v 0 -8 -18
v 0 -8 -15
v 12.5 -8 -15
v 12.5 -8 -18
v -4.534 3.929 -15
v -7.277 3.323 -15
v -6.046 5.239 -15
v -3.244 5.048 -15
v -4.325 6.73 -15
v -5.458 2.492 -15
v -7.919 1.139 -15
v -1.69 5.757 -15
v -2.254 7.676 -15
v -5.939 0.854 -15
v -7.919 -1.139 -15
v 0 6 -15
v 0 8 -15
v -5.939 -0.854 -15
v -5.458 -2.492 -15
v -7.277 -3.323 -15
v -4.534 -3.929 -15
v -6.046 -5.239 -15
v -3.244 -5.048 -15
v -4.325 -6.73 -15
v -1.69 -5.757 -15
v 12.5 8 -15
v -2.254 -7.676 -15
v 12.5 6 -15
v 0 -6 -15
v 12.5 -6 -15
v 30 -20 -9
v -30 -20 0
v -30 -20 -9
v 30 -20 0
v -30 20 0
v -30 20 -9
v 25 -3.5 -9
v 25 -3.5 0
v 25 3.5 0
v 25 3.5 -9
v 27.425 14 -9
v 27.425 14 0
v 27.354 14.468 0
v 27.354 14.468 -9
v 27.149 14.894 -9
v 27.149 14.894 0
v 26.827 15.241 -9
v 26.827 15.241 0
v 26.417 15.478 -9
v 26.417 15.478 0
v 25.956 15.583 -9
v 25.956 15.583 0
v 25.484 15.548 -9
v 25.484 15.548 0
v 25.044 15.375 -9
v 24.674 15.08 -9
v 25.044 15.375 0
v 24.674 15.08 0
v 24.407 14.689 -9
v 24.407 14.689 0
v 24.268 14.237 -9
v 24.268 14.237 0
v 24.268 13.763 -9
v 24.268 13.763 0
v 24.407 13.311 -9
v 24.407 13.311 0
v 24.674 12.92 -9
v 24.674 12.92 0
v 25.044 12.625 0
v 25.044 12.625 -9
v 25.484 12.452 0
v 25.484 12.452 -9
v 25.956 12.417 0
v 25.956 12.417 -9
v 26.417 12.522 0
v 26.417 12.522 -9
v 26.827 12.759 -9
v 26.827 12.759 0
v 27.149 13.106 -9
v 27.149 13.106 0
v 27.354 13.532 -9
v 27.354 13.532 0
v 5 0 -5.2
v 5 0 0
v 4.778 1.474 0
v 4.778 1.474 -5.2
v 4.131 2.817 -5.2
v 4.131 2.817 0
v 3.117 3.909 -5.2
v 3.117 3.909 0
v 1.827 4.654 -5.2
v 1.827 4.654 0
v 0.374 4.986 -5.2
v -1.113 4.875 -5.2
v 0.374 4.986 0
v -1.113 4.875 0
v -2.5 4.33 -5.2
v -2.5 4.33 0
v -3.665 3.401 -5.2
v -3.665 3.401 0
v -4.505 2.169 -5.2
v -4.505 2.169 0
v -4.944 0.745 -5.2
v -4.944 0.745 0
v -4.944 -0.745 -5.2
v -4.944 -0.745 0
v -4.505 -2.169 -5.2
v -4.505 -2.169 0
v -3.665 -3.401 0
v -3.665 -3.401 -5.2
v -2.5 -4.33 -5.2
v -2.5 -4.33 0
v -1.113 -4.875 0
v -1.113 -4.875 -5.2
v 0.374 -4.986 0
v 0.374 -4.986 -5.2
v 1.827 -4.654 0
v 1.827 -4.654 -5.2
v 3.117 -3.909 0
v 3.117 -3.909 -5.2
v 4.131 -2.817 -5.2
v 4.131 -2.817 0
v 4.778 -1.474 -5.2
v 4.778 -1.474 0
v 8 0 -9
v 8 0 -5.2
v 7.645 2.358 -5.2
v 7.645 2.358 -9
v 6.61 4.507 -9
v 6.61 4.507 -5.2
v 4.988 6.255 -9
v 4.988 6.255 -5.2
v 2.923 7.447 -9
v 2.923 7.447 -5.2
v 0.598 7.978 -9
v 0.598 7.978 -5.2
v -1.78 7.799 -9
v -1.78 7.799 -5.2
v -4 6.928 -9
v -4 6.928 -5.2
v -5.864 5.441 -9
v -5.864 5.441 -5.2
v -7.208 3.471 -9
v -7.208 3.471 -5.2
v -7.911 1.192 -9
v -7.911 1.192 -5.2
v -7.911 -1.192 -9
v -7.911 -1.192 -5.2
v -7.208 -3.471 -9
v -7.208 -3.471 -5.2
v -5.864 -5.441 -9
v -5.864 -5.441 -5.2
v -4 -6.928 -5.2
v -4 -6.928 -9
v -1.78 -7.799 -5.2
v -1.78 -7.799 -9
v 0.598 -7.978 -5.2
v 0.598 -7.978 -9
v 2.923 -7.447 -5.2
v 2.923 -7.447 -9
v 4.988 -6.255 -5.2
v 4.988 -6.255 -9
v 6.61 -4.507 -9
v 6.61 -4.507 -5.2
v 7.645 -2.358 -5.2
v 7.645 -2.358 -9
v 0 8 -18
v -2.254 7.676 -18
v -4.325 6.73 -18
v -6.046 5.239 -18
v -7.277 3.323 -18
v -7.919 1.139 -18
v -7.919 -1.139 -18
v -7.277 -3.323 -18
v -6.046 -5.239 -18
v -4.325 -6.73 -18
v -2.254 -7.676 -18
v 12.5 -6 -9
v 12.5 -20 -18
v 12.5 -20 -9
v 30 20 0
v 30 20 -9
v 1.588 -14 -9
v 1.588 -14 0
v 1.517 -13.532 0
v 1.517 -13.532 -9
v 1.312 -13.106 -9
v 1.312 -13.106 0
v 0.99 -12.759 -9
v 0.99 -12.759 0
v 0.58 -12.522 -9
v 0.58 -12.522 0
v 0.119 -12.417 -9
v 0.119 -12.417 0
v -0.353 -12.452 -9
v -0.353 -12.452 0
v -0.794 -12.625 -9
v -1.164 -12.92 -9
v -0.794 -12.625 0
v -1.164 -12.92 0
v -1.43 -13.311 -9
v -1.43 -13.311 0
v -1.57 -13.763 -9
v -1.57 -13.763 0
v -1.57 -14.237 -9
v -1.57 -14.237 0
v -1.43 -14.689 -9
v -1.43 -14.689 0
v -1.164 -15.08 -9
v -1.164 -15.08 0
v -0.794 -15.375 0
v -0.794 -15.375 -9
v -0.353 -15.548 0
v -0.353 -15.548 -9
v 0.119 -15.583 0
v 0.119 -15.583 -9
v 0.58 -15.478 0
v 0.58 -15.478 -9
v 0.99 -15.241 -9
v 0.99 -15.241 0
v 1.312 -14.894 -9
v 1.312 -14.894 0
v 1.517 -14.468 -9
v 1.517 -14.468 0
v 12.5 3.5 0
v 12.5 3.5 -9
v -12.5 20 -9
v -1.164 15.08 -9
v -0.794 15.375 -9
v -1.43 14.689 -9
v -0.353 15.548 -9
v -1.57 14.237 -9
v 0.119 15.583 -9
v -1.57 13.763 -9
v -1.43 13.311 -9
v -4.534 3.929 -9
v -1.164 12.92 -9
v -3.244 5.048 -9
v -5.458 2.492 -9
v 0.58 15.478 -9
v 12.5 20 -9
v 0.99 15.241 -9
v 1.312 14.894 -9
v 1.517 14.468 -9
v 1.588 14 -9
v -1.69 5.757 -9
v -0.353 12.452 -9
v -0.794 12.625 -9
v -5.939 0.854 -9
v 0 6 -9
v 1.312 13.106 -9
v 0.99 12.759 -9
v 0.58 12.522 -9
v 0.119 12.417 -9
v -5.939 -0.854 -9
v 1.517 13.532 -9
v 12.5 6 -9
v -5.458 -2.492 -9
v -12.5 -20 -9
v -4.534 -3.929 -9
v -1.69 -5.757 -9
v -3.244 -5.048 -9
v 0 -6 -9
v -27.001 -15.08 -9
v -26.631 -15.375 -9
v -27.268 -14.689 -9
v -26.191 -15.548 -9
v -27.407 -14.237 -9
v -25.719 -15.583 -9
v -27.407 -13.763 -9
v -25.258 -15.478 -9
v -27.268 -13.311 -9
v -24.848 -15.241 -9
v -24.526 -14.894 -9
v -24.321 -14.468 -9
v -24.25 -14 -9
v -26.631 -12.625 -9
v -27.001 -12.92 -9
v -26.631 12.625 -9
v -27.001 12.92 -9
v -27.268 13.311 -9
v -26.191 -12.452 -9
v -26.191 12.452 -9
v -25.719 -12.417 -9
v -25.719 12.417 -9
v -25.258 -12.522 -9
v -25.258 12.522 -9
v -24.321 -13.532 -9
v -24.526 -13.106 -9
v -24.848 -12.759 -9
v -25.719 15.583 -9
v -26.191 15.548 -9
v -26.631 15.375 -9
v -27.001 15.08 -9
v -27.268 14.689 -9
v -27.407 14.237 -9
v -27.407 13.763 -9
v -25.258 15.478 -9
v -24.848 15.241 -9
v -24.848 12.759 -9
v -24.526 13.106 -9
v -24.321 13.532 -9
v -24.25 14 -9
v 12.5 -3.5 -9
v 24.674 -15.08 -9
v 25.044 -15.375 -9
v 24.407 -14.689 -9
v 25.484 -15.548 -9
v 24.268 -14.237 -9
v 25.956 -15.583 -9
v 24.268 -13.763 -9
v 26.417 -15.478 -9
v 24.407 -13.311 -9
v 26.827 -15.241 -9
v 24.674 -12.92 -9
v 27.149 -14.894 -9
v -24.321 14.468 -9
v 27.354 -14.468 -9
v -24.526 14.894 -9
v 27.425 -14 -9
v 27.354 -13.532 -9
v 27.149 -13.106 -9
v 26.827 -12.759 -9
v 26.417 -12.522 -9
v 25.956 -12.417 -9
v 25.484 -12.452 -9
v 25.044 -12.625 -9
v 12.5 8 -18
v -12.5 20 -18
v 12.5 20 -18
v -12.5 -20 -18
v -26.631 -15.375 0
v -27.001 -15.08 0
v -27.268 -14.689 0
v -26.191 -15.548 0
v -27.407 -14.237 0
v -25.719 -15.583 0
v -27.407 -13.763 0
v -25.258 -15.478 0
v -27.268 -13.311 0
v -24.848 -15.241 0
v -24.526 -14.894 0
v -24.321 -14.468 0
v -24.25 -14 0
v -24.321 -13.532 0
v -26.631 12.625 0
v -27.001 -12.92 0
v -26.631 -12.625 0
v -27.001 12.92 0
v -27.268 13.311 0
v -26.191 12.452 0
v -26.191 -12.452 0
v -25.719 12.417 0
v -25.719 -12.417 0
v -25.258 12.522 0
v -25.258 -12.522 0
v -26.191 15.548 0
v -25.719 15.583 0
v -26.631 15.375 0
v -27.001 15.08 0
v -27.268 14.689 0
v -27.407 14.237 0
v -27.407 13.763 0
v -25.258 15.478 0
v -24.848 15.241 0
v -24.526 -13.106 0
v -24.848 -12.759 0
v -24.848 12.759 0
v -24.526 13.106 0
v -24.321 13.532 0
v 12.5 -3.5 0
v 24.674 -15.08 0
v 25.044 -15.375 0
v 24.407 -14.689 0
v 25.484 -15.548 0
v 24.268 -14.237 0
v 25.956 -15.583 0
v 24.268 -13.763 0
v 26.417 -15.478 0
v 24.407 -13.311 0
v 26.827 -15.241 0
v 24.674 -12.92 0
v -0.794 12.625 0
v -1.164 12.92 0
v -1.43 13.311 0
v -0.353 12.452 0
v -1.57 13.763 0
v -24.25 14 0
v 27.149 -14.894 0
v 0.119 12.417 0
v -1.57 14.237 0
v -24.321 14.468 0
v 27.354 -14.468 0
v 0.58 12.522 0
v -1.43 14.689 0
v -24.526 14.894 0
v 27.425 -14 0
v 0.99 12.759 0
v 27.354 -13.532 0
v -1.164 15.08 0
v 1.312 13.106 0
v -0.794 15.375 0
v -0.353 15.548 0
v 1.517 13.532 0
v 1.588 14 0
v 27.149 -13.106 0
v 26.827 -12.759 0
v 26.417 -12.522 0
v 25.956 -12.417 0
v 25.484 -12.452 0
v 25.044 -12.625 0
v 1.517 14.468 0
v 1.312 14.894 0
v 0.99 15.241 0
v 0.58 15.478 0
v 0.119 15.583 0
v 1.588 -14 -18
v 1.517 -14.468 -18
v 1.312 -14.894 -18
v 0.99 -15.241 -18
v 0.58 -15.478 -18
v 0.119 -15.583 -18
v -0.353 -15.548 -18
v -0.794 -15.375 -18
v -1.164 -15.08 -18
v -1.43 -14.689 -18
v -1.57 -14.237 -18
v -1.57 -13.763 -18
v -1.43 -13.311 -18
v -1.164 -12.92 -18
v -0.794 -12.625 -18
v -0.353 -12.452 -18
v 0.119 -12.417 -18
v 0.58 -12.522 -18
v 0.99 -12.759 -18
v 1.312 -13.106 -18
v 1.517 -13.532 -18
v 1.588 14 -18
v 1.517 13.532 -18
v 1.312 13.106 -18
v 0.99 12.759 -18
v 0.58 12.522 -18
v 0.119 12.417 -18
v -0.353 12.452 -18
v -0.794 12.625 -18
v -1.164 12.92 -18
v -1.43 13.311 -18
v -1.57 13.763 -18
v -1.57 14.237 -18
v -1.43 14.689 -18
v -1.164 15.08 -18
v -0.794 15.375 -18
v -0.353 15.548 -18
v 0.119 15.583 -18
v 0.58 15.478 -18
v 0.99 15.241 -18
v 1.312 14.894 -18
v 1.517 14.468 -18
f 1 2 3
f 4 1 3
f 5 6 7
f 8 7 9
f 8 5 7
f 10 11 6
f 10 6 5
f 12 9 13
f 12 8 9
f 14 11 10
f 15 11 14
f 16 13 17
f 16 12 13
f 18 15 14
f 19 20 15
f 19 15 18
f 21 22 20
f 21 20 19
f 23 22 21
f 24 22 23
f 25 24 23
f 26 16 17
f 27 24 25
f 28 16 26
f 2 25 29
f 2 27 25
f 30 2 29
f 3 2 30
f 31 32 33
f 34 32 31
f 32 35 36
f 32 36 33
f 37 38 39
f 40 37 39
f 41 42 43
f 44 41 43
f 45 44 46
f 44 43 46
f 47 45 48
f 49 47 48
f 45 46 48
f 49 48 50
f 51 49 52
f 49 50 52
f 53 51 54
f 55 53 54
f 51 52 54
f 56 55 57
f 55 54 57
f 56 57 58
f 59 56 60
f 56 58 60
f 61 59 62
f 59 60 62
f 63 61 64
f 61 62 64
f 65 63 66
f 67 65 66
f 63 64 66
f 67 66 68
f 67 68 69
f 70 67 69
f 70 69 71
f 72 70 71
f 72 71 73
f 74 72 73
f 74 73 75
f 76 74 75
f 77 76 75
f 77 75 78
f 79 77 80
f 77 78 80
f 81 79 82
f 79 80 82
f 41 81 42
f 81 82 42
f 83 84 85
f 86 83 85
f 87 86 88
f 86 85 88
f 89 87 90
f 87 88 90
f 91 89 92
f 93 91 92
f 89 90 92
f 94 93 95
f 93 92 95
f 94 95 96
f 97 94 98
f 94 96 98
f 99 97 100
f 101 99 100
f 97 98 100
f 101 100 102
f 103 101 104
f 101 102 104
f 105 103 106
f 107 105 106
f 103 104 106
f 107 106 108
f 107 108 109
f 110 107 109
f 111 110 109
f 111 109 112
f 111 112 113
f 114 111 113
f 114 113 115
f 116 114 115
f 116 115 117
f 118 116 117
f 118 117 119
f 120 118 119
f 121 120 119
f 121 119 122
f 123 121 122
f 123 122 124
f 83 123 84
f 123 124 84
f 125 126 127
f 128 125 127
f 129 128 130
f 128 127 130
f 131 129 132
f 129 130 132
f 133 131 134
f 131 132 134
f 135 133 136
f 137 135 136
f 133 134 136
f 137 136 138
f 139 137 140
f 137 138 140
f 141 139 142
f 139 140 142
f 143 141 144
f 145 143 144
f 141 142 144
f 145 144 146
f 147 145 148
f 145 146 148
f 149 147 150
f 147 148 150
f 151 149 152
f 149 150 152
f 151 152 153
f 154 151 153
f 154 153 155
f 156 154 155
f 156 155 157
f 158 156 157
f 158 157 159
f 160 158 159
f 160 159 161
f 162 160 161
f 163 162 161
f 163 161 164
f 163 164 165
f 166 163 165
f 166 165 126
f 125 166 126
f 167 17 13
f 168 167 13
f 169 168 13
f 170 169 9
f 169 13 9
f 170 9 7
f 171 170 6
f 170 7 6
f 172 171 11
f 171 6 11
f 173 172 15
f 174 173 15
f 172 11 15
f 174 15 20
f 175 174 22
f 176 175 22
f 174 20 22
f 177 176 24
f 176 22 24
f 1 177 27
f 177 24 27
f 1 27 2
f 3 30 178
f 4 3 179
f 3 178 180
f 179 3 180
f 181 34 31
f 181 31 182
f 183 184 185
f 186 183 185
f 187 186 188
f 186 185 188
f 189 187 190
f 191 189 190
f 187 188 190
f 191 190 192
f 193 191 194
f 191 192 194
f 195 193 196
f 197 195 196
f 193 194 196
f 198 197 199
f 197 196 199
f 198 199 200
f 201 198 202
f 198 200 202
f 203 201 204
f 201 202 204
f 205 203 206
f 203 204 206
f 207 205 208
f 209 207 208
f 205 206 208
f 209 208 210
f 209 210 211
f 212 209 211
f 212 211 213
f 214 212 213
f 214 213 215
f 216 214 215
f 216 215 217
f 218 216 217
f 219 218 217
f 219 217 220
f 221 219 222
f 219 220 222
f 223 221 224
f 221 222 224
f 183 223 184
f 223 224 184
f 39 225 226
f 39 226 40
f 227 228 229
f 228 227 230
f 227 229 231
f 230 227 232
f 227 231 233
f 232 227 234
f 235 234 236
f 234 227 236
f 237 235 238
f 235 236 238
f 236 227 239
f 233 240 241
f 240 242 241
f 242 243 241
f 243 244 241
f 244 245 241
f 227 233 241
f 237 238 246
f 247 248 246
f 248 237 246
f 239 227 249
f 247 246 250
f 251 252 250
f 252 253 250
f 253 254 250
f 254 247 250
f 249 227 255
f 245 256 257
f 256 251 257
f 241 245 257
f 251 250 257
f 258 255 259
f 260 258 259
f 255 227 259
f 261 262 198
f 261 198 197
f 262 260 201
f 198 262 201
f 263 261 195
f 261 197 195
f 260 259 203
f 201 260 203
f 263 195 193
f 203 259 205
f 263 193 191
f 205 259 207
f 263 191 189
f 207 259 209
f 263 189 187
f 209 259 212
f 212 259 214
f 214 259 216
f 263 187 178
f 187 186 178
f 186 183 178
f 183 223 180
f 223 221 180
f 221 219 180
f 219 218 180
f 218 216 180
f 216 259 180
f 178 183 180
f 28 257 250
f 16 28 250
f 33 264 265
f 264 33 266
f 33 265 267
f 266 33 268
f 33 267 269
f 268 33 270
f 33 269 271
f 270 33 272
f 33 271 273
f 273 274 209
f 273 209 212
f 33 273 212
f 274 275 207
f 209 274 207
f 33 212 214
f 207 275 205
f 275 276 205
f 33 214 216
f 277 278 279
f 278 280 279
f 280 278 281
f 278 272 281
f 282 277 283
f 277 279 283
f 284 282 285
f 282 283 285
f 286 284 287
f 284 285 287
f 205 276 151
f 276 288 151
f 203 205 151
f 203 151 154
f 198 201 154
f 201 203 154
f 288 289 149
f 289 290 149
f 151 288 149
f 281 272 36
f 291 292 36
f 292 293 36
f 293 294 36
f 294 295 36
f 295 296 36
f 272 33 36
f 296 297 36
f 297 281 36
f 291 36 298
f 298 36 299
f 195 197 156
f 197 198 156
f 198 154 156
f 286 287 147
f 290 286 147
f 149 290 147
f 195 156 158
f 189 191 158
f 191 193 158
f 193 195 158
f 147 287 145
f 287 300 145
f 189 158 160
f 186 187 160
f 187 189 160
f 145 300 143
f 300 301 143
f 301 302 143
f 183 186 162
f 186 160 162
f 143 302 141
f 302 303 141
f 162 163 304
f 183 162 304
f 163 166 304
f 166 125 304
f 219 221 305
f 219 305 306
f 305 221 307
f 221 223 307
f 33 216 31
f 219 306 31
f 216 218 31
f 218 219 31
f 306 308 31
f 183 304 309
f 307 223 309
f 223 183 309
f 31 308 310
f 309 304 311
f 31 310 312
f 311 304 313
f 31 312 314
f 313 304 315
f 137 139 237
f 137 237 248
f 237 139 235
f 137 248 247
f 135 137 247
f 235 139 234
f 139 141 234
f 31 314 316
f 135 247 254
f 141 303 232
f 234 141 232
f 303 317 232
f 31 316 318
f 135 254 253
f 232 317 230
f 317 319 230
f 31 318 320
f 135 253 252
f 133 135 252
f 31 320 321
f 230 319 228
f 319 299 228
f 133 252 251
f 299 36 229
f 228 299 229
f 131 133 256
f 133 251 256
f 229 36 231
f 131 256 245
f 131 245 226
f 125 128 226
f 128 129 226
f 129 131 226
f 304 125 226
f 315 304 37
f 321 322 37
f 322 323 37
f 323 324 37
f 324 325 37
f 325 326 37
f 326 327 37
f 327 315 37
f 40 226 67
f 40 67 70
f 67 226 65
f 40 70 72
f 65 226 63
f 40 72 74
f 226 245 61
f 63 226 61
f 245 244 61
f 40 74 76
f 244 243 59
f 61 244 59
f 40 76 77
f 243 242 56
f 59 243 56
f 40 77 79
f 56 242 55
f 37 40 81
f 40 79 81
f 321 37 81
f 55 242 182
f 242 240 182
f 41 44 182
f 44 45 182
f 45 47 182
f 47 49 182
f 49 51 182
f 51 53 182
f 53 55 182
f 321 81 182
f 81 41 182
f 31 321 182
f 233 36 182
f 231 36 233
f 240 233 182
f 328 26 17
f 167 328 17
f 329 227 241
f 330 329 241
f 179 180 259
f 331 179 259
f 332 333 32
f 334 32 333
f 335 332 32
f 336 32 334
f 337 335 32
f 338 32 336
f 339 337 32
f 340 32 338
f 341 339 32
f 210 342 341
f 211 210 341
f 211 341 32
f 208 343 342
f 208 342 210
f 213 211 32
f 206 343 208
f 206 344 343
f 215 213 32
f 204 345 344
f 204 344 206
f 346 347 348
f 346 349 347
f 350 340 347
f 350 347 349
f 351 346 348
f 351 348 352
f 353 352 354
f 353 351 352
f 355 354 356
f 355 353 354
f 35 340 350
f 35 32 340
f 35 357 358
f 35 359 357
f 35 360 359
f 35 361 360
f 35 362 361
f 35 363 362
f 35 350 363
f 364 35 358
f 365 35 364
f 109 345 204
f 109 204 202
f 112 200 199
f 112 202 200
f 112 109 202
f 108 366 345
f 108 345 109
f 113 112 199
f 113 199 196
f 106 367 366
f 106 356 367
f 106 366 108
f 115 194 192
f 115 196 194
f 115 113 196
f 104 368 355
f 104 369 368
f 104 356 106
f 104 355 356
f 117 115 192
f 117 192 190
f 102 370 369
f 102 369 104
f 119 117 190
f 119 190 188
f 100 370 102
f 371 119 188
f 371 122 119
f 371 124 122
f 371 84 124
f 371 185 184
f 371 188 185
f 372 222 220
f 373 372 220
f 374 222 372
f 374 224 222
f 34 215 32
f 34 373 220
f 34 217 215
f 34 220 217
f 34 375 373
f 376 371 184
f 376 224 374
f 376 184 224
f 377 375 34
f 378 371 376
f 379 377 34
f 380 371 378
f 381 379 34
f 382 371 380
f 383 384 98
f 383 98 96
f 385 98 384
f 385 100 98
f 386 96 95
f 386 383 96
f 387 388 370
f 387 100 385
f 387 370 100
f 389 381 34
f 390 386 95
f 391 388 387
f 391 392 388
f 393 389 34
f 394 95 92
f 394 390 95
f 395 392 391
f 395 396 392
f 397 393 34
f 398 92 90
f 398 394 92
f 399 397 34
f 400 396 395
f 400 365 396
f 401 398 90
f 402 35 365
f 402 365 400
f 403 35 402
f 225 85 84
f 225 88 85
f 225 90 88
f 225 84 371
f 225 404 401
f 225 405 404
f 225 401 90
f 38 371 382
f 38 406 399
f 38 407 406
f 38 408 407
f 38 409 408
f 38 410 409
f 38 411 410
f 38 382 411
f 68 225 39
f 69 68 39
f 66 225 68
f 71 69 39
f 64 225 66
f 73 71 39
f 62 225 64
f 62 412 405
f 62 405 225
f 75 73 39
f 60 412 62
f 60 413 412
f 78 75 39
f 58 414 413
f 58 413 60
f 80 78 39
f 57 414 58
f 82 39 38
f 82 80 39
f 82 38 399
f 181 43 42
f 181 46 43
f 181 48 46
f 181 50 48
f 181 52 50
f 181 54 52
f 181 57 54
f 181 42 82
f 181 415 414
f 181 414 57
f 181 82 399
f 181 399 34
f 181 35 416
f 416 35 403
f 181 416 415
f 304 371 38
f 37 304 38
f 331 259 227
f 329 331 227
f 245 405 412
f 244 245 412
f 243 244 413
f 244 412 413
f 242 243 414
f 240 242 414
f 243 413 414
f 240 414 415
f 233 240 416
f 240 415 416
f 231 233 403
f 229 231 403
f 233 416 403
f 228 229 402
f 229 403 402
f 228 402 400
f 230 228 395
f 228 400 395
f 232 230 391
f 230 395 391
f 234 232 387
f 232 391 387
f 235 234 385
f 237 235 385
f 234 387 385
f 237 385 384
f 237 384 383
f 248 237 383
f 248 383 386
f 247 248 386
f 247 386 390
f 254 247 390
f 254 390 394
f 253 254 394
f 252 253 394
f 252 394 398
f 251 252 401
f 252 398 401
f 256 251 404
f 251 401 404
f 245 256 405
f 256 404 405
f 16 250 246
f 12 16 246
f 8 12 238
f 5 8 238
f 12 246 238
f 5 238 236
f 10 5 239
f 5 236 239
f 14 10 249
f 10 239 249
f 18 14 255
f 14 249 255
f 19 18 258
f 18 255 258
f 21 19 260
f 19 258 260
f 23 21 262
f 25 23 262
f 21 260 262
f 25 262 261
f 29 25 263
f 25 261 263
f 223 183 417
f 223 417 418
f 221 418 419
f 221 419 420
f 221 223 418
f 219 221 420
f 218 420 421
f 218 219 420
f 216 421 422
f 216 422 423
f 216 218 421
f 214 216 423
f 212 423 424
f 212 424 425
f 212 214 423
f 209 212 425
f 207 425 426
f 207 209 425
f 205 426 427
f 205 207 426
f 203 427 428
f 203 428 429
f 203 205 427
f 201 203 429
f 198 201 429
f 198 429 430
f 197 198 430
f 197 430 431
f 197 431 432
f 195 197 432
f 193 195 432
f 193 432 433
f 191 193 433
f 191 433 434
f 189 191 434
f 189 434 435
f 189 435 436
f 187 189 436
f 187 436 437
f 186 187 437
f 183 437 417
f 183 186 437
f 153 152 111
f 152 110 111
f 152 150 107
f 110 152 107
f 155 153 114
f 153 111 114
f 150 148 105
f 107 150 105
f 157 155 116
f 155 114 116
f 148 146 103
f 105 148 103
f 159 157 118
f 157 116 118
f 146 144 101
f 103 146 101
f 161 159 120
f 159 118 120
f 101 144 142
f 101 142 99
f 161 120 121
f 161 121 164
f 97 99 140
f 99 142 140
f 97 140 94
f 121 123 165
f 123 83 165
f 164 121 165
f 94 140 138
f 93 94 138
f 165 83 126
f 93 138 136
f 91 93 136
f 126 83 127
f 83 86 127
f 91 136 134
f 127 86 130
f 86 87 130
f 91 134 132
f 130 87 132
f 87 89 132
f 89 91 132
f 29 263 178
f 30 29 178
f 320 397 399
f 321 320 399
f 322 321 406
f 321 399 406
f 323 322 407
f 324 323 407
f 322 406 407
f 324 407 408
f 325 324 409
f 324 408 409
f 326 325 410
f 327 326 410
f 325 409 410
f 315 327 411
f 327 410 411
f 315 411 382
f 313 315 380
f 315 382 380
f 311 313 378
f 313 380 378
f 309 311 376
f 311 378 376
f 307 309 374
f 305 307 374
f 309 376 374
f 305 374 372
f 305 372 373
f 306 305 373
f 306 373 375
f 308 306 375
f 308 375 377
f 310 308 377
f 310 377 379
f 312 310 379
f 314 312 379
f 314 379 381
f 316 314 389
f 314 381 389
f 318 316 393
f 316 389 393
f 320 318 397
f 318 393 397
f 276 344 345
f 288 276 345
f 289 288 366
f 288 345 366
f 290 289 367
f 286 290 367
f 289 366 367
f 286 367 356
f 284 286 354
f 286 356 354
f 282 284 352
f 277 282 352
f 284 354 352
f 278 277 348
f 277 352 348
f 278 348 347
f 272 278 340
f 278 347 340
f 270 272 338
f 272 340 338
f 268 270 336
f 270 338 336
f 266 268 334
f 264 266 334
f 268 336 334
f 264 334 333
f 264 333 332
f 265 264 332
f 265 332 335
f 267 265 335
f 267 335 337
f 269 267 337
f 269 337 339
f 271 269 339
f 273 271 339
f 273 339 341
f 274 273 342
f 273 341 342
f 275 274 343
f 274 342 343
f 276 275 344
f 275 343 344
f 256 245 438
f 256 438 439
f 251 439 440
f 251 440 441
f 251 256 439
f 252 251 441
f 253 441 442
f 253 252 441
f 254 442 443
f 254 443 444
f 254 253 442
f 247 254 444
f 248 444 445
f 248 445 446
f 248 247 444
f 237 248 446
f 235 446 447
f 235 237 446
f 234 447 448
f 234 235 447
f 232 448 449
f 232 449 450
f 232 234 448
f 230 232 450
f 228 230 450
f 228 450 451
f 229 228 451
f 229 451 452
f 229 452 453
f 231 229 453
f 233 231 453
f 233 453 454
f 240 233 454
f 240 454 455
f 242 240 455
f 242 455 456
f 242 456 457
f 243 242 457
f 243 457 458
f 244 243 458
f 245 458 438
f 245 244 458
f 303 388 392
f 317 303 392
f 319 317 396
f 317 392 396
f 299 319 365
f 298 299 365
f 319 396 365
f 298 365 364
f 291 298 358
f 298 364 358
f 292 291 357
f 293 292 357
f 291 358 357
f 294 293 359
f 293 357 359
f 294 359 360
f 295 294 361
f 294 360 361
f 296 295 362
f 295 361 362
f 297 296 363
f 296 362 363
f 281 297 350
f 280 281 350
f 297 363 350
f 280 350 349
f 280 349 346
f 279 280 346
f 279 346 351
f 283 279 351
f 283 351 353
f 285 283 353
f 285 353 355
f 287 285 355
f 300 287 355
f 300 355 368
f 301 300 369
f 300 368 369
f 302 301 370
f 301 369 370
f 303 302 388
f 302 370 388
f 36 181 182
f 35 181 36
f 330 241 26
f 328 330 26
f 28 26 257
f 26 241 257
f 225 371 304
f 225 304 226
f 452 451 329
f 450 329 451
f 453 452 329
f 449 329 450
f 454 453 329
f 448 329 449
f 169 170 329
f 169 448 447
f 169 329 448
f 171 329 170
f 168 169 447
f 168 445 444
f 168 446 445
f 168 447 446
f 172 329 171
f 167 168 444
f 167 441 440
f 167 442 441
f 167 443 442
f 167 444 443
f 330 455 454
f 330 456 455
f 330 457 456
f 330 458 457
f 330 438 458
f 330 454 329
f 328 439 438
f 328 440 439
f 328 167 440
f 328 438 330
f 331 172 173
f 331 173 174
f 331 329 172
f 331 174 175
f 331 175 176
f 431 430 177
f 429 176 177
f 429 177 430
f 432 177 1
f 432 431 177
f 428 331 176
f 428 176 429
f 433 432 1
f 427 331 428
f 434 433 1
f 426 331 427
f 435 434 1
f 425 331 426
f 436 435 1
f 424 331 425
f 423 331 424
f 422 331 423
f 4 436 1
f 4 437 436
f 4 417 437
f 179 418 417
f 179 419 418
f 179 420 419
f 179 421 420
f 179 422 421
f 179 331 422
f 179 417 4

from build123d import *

# Parameters (mm, degrees)
F0_R     = 1.5875
F0_R_2   = 8
F0_W     = 12.5
F0_H     = 7
F1_DEPTH = 9
F0_R_3   = 5
F2_DEPTH = 5.2
F3_R     = 1.5875
F4_DEPTH = 9
F5_DEPTH = 6


with BuildPart() as f1:
    # F0 (on Top) → F1 (new body)
    with BuildSketch(Plane.XY):
        Polygon((30, -20), (30, 20), (-30, 20), (-30, -20), (-24.25, -20), (24.25, -20), align=None)
        with Locations((-25.8375, -14)):
            Circle(F0_R, mode=Mode.SUBTRACT)
        with Locations((-25.8375, 14)):
            Circle(F0_R, mode=Mode.SUBTRACT)
        with Locations((0, -14)):
            Circle(F0_R, mode=Mode.SUBTRACT)
        with Locations((25.8375, -14)):
            Circle(F0_R, mode=Mode.SUBTRACT)
        Circle(F0_R_2, mode=Mode.SUBTRACT)
        with Locations((0, 14)):
            Circle(F0_R, mode=Mode.SUBTRACT)
        with Locations((18.75, 0)):
            Rectangle(F0_W, F0_H, mode=Mode.SUBTRACT)
        with Locations((25.8375, 14)):
            Circle(F0_R, mode=Mode.SUBTRACT)
    extrude(amount=-F1_DEPTH)

    # F0 (on Top) → F2 (join, through all)
    with BuildSketch(Plane.XY):
        Circle(F0_R_2)
        Circle(F0_R_3, mode=Mode.SUBTRACT)
    extrude(amount=-F2_DEPTH)


with BuildPart() as f4:
    # F3 (on face) → F4 (new body)
    with BuildSketch(Plane(origin=(0, 0, -9), x_dir=(1, 0, 0), z_dir=(0, 0, -1))):
        with BuildLine():
            Line((12.5, 20), (-12.5, 20))
            Line((-12.5, 20), (-12.5, -20))
            Line((-12.5, -20), (12.5, -20))
            Line((12.5, -20), (12.5, -8))
            Line((12.5, -8), (0, -8))
            ThreePointArc((0, -8), (-8, 0), (0, 8))
            Line((0, 8), (12.5, 8))
            Line((12.5, 8), (12.5, 20))
        make_face()
        with Locations((0, -14)):
            Circle(F3_R, mode=Mode.SUBTRACT)
        with Locations((0, 14)):
            Circle(F3_R, mode=Mode.SUBTRACT)
    extrude(amount=F4_DEPTH)

    # F3 (on face) → F5 (join)
    with BuildSketch(Plane(origin=(0, 0, -9), x_dir=(1, 0, 0), z_dir=(0, 0, -1))):
        with BuildLine():
            Line((0, -8), (12.5, -8))
            Line((12.5, -8), (12.5, -6))
            Line((12.5, -6), (5.2915026221, -6))
            ThreePointArc((5.2915026221, -6), (2.8284271247, -7.4833147735), (0, -8))
        make_face()
        with BuildLine():
            ThreePointArc((5.2915026221, 6), (2.8284271247, 7.4833147735), (0, 8))
            ThreePointArc((0, 8), (-8, 0), (0, -8))
            ThreePointArc((0, -8), (2.8284271247, -7.4833147735), (5.2915026221, -6))
            Line((5.2915026221, -6), (0, -6))
            ThreePointArc((0, -6), (-6, 0), (0, 6))
            Line((0, 6), (5.2915026221, 6))
        make_face()
        with BuildLine():
            Line((12.5, 6), (12.5, 8))
            Line((12.5, 8), (0, 8))
            ThreePointArc((0, 8), (2.8284271247, 7.4833147735), (5.2915026221, 6))
            Line((5.2915026221, 6), (12.5, 6))
        make_face()
    extrude(amount=F5_DEPTH)


solid = Compound([f1.part, f4.part])
